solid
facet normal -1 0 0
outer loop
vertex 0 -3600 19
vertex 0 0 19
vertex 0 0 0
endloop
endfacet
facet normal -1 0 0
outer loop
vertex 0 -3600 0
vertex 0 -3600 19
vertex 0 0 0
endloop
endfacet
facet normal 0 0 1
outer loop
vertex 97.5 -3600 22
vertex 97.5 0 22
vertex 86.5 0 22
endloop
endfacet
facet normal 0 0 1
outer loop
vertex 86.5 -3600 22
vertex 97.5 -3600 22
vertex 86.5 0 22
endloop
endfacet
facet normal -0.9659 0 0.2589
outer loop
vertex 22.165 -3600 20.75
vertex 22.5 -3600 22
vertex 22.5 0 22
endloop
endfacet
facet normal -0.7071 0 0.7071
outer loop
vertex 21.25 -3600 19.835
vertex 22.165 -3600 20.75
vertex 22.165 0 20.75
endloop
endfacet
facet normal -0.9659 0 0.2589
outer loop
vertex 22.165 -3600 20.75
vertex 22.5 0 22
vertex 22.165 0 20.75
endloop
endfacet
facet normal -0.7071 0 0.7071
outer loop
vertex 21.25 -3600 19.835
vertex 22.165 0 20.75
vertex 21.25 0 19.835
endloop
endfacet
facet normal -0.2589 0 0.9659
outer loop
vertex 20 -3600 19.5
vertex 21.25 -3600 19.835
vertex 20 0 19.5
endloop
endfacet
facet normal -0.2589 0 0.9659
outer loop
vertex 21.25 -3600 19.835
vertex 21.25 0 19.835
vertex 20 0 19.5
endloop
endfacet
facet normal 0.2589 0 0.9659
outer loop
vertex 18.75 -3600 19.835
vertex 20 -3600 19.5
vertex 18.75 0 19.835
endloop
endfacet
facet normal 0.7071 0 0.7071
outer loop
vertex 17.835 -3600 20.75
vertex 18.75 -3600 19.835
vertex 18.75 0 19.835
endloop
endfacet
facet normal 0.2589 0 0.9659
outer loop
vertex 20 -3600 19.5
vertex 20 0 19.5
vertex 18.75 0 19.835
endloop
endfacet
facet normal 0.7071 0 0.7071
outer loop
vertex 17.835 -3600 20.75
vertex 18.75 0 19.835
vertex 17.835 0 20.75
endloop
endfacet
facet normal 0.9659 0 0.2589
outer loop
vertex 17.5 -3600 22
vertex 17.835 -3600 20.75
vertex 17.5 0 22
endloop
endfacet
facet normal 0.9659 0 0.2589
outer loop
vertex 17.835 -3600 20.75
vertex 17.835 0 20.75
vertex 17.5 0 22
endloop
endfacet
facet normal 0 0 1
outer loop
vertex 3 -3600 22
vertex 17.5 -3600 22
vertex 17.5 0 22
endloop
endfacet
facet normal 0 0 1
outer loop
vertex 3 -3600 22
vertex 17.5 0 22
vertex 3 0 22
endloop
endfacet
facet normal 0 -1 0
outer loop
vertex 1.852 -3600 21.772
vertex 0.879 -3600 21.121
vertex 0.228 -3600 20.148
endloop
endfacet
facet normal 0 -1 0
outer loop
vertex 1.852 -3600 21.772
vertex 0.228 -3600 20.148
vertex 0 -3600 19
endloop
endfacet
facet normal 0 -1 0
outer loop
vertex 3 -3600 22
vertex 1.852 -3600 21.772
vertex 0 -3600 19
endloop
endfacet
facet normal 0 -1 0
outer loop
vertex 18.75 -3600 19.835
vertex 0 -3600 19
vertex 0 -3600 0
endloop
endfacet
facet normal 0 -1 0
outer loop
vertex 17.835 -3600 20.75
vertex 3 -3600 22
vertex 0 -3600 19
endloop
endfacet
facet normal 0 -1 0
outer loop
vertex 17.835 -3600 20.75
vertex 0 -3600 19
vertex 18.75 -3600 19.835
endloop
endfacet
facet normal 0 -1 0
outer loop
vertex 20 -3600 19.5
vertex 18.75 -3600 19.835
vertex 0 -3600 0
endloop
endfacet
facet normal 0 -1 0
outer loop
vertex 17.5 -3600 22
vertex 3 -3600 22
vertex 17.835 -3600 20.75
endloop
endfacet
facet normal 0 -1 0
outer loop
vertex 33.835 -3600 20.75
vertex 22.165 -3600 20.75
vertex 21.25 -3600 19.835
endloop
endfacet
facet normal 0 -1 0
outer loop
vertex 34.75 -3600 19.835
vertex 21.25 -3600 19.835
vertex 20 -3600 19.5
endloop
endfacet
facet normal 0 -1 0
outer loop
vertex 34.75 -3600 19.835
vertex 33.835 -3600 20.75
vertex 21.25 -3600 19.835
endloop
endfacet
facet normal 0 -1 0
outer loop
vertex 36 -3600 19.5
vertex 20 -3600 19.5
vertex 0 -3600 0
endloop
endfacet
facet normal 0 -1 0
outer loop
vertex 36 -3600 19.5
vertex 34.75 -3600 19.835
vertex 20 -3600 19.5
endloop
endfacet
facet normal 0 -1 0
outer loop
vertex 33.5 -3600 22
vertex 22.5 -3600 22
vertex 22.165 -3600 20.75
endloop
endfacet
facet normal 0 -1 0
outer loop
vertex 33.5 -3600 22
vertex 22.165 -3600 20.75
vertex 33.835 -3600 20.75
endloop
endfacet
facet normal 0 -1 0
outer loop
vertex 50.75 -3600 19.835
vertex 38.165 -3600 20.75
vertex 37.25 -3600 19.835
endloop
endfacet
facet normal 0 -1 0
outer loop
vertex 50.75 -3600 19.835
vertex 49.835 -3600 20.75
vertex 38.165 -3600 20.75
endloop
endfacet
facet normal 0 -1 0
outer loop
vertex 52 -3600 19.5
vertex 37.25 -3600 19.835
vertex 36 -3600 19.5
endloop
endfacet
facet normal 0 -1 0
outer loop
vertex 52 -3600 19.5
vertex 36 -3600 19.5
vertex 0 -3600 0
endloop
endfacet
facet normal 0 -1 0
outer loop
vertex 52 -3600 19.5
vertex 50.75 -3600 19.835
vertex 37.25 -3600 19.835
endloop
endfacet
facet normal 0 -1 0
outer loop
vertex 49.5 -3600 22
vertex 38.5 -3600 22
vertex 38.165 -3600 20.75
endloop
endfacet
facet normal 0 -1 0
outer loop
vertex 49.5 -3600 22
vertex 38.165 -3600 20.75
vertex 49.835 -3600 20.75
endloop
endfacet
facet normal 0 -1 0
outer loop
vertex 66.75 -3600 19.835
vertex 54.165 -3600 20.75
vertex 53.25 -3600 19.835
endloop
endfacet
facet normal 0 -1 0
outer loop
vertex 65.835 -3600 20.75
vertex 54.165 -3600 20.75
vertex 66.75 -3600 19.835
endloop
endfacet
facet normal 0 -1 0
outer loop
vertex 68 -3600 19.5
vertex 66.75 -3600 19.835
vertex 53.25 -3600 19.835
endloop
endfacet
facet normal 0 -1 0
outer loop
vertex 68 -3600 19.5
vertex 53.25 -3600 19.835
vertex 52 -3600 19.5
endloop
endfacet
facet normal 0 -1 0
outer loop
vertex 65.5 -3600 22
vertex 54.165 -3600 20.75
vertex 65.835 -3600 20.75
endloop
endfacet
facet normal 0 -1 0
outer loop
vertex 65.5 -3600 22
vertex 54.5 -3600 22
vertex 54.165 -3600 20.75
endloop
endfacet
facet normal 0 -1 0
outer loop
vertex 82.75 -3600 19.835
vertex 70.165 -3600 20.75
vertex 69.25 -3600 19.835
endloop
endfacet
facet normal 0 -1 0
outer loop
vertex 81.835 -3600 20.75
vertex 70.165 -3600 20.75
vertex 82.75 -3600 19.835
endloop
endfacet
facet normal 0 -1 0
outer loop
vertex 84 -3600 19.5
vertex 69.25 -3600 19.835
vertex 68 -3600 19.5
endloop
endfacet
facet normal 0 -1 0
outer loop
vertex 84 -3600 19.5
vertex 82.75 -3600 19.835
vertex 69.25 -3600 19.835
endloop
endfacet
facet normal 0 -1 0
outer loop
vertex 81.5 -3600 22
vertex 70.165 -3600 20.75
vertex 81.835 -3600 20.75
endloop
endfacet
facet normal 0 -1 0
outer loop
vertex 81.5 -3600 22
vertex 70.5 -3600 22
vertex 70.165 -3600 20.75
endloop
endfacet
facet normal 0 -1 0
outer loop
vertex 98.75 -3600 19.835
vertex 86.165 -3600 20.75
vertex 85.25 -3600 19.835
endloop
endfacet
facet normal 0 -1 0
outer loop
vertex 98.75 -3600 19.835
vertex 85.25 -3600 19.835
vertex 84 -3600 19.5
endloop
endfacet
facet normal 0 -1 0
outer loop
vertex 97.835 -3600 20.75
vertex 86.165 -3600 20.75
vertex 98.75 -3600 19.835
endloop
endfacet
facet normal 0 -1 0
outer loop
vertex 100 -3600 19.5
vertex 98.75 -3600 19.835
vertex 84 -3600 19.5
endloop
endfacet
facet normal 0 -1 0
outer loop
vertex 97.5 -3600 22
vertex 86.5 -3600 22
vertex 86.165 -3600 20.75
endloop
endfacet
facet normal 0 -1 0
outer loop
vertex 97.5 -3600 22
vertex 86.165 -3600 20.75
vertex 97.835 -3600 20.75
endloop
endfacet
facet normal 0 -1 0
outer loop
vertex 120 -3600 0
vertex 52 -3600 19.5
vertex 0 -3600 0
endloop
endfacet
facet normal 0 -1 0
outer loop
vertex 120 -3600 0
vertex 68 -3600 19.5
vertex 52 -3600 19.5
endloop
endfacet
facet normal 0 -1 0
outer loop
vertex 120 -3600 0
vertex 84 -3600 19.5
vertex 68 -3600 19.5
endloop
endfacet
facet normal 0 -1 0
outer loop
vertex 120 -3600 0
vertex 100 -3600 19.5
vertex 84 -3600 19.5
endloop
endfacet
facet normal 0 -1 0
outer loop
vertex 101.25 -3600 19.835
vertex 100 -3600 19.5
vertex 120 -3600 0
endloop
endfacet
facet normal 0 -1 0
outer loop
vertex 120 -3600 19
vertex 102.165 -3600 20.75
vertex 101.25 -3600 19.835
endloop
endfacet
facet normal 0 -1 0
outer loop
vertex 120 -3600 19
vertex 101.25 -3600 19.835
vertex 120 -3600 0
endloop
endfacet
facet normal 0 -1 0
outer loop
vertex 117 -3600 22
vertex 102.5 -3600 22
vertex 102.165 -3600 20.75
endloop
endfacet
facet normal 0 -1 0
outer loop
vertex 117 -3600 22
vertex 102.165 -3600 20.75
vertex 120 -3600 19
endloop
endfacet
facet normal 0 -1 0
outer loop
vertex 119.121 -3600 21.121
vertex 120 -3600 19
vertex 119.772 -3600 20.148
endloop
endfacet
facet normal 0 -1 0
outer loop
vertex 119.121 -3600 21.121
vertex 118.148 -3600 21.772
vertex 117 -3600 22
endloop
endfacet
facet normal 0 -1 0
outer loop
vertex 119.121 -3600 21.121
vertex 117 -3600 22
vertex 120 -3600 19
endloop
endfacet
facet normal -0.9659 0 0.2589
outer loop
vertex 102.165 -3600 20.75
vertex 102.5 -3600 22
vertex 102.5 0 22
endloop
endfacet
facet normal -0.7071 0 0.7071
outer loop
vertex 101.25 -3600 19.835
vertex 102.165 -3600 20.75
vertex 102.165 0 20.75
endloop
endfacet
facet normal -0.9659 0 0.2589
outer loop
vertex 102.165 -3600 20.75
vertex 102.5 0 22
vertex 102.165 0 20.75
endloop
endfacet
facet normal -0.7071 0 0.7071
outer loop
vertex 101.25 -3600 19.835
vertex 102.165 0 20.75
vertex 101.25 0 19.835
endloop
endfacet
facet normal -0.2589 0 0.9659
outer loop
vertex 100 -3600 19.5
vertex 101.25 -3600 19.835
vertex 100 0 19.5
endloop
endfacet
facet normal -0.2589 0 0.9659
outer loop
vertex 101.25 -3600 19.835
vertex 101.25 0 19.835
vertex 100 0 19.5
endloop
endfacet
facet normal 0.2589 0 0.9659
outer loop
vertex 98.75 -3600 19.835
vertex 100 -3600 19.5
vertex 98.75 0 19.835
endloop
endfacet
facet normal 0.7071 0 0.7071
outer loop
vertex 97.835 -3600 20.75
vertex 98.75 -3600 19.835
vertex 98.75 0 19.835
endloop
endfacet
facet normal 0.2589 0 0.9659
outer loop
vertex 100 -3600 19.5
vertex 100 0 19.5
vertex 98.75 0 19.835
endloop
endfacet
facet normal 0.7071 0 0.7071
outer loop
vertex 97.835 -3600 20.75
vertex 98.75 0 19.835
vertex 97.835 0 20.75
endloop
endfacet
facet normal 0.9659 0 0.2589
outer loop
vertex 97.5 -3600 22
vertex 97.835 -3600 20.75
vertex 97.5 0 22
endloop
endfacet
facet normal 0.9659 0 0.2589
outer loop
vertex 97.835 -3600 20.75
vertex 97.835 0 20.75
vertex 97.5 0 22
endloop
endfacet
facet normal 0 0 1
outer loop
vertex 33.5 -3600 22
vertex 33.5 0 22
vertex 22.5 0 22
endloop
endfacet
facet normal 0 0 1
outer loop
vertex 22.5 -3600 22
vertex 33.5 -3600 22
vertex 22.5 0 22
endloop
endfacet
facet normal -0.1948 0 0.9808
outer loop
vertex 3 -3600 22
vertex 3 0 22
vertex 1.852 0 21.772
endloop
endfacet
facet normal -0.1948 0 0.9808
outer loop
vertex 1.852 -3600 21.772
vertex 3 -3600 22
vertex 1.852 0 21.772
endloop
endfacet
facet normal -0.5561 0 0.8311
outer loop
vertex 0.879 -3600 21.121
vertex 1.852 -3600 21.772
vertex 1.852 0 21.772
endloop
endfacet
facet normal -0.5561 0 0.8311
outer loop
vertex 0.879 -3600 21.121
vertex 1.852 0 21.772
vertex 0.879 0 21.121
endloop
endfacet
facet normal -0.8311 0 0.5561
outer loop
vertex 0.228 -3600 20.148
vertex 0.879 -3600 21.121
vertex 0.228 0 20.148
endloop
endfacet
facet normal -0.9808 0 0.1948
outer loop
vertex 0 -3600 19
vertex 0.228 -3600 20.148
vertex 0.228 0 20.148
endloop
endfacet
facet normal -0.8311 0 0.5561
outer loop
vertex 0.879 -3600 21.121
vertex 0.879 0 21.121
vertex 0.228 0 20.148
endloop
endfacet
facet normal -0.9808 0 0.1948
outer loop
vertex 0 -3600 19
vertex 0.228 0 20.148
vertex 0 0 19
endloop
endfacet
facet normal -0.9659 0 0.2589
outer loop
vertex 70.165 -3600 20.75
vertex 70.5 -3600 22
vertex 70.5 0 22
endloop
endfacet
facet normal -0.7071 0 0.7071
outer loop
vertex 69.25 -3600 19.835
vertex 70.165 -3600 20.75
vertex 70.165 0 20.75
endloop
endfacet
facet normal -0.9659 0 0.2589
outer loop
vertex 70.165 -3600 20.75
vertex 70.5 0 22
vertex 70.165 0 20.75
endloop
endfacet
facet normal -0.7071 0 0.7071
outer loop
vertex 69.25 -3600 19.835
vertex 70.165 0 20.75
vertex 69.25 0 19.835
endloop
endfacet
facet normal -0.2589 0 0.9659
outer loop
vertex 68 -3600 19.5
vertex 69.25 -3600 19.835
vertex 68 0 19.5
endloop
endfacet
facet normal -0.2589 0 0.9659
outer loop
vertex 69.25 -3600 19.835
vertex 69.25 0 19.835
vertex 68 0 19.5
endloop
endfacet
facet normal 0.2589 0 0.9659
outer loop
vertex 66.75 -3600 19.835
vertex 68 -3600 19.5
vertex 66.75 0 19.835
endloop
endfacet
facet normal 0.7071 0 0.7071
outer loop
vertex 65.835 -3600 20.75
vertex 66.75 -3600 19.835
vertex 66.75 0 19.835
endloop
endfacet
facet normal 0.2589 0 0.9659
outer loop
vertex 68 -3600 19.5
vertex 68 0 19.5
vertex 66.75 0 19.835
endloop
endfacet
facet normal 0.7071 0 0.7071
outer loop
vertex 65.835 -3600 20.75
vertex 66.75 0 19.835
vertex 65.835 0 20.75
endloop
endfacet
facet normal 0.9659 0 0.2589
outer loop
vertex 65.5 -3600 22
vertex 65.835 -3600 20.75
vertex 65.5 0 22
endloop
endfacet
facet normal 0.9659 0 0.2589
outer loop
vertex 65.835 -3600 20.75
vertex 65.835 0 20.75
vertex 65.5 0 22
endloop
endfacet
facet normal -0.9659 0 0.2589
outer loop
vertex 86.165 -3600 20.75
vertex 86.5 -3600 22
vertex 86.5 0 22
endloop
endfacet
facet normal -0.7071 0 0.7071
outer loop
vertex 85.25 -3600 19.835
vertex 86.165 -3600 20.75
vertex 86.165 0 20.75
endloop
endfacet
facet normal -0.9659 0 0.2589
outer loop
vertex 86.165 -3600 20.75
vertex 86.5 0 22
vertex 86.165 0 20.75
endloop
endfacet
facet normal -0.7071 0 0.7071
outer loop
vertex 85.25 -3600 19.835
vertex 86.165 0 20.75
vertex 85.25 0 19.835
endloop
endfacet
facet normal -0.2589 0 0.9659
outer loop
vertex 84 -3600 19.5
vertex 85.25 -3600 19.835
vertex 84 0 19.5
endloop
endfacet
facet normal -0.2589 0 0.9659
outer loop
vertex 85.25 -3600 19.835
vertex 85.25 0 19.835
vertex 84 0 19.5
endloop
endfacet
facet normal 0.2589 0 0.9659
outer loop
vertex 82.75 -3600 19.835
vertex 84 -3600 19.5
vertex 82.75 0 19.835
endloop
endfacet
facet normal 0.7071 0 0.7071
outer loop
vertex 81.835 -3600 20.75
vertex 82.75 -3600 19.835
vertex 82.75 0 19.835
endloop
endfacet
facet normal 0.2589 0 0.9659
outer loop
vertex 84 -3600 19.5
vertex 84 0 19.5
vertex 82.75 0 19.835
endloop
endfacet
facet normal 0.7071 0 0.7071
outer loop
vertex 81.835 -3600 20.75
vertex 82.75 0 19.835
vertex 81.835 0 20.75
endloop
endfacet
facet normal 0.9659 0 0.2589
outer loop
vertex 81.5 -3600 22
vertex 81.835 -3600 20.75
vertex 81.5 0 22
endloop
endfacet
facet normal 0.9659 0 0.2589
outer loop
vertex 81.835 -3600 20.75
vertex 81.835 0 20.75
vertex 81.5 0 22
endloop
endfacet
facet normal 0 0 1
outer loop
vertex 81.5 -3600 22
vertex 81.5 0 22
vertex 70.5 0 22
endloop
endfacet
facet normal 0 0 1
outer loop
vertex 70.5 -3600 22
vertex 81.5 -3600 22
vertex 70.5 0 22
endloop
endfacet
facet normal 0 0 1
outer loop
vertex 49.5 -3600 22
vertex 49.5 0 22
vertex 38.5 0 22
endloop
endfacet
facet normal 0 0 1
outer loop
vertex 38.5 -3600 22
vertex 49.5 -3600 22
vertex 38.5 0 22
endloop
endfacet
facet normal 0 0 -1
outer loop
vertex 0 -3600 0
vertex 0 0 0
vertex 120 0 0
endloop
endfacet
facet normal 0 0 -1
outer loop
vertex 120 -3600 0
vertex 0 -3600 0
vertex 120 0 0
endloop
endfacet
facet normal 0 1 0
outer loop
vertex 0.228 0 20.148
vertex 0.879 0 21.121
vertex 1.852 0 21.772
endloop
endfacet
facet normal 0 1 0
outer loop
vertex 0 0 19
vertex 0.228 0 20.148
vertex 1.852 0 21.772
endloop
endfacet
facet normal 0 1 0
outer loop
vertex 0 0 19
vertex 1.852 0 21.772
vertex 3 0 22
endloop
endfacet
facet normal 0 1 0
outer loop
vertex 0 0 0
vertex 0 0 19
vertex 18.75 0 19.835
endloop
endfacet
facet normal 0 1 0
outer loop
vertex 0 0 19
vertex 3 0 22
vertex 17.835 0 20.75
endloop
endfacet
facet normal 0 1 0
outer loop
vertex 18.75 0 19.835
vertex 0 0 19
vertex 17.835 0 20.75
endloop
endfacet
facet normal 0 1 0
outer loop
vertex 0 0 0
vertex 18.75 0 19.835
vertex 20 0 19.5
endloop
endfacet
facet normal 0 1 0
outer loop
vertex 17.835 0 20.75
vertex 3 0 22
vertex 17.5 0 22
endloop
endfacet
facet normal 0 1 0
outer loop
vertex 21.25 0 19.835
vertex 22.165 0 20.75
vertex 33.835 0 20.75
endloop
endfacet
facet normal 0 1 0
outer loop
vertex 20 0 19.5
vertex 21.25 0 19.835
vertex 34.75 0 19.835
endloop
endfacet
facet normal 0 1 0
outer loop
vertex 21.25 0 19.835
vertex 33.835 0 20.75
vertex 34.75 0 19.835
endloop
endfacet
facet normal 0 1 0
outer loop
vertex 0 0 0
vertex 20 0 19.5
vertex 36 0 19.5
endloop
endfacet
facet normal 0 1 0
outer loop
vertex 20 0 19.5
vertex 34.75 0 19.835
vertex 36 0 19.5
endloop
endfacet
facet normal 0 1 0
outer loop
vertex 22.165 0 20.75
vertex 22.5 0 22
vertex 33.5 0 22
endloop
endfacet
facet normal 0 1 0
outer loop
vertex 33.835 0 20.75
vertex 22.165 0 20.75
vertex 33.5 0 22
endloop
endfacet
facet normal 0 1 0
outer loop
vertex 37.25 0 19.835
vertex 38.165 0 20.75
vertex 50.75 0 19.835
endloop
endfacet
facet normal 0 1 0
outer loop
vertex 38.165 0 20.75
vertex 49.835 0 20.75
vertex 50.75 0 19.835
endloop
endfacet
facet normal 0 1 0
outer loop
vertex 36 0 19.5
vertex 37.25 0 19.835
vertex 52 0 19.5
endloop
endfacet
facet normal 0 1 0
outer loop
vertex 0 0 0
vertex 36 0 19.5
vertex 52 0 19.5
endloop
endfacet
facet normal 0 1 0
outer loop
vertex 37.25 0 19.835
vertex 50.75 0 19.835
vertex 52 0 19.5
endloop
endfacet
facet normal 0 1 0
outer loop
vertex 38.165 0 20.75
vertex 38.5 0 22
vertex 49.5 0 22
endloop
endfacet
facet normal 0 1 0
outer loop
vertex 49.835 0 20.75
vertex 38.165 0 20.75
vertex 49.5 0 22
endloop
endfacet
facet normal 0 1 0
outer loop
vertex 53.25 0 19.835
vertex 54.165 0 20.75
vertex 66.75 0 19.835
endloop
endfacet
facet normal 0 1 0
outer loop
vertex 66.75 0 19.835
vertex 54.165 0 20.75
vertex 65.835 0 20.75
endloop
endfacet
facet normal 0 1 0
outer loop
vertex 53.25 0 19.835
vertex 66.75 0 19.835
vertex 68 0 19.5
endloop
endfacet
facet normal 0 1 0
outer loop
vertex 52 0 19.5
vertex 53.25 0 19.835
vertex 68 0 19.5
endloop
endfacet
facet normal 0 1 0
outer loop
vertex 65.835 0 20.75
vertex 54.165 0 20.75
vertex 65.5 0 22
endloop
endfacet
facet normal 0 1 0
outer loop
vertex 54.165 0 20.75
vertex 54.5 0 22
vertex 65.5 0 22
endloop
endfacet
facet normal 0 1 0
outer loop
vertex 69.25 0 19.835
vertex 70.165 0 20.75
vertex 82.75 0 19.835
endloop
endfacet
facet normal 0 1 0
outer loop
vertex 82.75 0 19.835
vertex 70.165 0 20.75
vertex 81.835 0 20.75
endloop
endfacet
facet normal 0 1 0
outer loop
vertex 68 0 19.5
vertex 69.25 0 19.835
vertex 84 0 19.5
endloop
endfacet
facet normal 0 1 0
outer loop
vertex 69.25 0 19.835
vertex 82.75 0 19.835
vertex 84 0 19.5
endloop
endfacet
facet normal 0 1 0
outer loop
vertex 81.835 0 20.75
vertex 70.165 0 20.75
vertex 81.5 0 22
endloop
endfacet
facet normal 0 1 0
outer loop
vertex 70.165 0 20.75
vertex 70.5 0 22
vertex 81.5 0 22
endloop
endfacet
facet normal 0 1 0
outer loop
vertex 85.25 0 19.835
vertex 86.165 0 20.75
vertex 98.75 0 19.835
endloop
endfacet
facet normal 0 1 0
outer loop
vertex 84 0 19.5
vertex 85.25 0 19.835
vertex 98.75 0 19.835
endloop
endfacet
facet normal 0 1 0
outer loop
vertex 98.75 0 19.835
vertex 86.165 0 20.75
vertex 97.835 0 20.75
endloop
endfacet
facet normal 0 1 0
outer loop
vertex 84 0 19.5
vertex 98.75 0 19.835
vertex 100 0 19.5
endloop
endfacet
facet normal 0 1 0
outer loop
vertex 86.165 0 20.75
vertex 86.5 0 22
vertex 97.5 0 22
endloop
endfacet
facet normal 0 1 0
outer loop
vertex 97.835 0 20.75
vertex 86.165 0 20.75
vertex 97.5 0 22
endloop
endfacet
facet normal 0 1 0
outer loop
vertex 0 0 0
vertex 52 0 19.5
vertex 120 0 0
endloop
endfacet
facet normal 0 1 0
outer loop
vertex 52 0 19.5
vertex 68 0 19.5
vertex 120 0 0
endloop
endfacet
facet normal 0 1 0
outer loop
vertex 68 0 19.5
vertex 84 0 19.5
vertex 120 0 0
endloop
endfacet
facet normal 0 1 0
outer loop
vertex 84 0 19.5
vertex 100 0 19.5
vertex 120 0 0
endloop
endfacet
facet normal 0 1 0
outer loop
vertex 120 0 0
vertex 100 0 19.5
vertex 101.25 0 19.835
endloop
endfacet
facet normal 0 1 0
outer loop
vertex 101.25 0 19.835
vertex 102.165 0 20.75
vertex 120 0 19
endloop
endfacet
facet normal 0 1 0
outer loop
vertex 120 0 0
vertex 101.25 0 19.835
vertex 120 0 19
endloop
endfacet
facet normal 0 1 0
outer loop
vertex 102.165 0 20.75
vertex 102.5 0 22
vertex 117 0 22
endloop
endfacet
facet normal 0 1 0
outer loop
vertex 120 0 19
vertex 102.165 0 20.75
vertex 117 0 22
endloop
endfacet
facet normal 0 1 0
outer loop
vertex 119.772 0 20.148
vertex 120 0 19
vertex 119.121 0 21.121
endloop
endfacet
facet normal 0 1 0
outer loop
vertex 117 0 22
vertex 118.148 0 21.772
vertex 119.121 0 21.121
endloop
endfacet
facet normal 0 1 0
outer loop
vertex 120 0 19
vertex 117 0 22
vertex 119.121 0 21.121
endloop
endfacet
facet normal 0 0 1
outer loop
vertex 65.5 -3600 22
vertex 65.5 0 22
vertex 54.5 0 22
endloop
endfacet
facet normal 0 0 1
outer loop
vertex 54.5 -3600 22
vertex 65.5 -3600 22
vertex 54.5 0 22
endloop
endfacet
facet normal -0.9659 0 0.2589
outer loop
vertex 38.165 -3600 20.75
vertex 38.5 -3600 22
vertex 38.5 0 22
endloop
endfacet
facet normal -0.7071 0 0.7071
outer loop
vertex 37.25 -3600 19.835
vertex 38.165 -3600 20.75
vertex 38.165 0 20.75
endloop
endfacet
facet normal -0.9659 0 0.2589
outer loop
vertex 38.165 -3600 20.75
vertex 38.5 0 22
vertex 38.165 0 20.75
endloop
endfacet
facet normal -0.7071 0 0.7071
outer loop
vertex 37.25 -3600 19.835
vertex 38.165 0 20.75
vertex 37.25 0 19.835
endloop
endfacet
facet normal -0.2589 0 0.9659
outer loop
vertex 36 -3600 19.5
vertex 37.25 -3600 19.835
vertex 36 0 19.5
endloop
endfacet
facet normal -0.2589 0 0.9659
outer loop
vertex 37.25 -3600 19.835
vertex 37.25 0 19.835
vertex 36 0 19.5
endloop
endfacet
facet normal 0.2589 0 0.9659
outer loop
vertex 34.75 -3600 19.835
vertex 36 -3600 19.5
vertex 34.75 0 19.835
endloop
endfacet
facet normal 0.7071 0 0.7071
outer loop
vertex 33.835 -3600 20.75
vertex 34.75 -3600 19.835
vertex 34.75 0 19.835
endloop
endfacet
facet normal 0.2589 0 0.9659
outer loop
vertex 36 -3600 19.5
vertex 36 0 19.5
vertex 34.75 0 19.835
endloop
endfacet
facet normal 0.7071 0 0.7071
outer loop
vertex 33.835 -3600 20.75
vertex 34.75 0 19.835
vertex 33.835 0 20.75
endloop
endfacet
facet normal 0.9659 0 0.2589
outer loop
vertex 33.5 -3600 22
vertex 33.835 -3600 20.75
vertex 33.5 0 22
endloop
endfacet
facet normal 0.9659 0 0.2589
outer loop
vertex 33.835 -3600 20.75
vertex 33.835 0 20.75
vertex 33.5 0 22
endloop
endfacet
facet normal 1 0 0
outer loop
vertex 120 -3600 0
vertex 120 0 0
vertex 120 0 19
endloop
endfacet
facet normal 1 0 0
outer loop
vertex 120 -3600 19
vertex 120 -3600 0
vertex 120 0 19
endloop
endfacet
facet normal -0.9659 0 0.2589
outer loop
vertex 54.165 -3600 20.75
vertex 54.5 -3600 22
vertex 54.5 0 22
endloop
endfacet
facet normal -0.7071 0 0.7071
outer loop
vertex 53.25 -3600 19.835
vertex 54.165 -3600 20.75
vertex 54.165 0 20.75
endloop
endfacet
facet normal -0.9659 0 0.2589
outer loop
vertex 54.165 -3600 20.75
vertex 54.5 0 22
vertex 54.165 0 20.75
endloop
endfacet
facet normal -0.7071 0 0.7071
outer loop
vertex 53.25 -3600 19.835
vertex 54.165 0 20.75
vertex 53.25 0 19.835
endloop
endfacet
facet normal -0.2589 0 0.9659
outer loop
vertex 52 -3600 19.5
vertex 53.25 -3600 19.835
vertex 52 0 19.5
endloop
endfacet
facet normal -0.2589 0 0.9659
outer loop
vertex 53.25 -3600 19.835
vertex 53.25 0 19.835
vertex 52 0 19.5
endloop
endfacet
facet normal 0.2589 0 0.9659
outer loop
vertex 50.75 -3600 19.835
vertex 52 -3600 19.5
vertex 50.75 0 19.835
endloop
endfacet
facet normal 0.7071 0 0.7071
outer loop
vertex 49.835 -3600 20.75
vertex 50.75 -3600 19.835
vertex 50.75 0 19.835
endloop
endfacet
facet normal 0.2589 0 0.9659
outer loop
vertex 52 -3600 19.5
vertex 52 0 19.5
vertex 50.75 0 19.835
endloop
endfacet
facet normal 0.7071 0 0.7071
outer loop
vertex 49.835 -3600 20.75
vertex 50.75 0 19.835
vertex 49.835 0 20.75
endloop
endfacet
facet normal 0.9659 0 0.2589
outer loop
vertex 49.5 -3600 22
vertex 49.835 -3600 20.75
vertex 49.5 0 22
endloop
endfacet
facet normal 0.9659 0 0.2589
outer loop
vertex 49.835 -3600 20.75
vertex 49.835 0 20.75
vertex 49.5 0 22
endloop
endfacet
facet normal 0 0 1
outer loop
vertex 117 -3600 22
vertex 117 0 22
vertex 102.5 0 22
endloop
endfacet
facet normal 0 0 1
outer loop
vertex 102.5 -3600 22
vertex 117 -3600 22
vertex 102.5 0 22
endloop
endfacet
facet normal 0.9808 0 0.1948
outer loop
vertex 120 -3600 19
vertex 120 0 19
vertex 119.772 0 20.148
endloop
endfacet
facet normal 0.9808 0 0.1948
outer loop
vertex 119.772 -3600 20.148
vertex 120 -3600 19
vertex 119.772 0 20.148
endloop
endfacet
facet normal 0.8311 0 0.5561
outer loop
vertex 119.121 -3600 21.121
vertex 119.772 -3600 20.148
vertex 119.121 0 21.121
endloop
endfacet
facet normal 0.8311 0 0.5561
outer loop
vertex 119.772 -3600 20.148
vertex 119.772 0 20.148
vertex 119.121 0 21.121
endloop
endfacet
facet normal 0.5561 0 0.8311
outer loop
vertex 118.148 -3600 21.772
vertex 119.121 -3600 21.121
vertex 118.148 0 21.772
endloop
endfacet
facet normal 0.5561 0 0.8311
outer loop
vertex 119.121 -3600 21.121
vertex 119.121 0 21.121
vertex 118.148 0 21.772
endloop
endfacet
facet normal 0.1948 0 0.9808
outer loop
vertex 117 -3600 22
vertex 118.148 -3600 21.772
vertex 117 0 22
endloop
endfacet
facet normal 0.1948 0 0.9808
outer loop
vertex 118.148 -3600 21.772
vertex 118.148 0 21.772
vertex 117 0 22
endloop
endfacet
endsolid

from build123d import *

# Parameters (mm, degrees)
F1_DEPTH = 3600


with BuildPart() as f1:
    # F0 (on Front) → F1 (new body)
    with BuildSketch(Plane.XZ):
        with BuildLine():
            Line((0, 19), (0, 0))
            Line((0, 0), (120, 0))
            Line((120, 0), (120, 19))
            ThreePointArc((120, 19), (119.12132, 21.12132), (117, 22))
            Line((117, 22), (102.5, 22))
            ThreePointArc((102.5, 22), (100, 19.5), (97.5, 22))
            Line((97.5, 22), (86.5, 22))
            ThreePointArc((86.5, 22), (84, 19.5), (81.5, 22))
            Line((81.5, 22), (70.5, 22))
            ThreePointArc((70.5, 22), (68, 19.5), (65.5, 22))
            Line((65.5, 22), (54.5, 22))
            ThreePointArc((54.5, 22), (52, 19.5), (49.5, 22))
            Line((49.5, 22), (38.5, 22))
            ThreePointArc((38.5, 22), (36, 19.5), (33.5, 22))
            Line((33.5, 22), (22.5, 22))
            ThreePointArc((22.5, 22), (20, 19.5), (17.5, 22))
            Line((17.5, 22), (3, 22))
            ThreePointArc((3, 22), (0.87868, 21.12132), (0, 19))
        make_face()
    extrude(amount=F1_DEPTH)


solid = f1.part
